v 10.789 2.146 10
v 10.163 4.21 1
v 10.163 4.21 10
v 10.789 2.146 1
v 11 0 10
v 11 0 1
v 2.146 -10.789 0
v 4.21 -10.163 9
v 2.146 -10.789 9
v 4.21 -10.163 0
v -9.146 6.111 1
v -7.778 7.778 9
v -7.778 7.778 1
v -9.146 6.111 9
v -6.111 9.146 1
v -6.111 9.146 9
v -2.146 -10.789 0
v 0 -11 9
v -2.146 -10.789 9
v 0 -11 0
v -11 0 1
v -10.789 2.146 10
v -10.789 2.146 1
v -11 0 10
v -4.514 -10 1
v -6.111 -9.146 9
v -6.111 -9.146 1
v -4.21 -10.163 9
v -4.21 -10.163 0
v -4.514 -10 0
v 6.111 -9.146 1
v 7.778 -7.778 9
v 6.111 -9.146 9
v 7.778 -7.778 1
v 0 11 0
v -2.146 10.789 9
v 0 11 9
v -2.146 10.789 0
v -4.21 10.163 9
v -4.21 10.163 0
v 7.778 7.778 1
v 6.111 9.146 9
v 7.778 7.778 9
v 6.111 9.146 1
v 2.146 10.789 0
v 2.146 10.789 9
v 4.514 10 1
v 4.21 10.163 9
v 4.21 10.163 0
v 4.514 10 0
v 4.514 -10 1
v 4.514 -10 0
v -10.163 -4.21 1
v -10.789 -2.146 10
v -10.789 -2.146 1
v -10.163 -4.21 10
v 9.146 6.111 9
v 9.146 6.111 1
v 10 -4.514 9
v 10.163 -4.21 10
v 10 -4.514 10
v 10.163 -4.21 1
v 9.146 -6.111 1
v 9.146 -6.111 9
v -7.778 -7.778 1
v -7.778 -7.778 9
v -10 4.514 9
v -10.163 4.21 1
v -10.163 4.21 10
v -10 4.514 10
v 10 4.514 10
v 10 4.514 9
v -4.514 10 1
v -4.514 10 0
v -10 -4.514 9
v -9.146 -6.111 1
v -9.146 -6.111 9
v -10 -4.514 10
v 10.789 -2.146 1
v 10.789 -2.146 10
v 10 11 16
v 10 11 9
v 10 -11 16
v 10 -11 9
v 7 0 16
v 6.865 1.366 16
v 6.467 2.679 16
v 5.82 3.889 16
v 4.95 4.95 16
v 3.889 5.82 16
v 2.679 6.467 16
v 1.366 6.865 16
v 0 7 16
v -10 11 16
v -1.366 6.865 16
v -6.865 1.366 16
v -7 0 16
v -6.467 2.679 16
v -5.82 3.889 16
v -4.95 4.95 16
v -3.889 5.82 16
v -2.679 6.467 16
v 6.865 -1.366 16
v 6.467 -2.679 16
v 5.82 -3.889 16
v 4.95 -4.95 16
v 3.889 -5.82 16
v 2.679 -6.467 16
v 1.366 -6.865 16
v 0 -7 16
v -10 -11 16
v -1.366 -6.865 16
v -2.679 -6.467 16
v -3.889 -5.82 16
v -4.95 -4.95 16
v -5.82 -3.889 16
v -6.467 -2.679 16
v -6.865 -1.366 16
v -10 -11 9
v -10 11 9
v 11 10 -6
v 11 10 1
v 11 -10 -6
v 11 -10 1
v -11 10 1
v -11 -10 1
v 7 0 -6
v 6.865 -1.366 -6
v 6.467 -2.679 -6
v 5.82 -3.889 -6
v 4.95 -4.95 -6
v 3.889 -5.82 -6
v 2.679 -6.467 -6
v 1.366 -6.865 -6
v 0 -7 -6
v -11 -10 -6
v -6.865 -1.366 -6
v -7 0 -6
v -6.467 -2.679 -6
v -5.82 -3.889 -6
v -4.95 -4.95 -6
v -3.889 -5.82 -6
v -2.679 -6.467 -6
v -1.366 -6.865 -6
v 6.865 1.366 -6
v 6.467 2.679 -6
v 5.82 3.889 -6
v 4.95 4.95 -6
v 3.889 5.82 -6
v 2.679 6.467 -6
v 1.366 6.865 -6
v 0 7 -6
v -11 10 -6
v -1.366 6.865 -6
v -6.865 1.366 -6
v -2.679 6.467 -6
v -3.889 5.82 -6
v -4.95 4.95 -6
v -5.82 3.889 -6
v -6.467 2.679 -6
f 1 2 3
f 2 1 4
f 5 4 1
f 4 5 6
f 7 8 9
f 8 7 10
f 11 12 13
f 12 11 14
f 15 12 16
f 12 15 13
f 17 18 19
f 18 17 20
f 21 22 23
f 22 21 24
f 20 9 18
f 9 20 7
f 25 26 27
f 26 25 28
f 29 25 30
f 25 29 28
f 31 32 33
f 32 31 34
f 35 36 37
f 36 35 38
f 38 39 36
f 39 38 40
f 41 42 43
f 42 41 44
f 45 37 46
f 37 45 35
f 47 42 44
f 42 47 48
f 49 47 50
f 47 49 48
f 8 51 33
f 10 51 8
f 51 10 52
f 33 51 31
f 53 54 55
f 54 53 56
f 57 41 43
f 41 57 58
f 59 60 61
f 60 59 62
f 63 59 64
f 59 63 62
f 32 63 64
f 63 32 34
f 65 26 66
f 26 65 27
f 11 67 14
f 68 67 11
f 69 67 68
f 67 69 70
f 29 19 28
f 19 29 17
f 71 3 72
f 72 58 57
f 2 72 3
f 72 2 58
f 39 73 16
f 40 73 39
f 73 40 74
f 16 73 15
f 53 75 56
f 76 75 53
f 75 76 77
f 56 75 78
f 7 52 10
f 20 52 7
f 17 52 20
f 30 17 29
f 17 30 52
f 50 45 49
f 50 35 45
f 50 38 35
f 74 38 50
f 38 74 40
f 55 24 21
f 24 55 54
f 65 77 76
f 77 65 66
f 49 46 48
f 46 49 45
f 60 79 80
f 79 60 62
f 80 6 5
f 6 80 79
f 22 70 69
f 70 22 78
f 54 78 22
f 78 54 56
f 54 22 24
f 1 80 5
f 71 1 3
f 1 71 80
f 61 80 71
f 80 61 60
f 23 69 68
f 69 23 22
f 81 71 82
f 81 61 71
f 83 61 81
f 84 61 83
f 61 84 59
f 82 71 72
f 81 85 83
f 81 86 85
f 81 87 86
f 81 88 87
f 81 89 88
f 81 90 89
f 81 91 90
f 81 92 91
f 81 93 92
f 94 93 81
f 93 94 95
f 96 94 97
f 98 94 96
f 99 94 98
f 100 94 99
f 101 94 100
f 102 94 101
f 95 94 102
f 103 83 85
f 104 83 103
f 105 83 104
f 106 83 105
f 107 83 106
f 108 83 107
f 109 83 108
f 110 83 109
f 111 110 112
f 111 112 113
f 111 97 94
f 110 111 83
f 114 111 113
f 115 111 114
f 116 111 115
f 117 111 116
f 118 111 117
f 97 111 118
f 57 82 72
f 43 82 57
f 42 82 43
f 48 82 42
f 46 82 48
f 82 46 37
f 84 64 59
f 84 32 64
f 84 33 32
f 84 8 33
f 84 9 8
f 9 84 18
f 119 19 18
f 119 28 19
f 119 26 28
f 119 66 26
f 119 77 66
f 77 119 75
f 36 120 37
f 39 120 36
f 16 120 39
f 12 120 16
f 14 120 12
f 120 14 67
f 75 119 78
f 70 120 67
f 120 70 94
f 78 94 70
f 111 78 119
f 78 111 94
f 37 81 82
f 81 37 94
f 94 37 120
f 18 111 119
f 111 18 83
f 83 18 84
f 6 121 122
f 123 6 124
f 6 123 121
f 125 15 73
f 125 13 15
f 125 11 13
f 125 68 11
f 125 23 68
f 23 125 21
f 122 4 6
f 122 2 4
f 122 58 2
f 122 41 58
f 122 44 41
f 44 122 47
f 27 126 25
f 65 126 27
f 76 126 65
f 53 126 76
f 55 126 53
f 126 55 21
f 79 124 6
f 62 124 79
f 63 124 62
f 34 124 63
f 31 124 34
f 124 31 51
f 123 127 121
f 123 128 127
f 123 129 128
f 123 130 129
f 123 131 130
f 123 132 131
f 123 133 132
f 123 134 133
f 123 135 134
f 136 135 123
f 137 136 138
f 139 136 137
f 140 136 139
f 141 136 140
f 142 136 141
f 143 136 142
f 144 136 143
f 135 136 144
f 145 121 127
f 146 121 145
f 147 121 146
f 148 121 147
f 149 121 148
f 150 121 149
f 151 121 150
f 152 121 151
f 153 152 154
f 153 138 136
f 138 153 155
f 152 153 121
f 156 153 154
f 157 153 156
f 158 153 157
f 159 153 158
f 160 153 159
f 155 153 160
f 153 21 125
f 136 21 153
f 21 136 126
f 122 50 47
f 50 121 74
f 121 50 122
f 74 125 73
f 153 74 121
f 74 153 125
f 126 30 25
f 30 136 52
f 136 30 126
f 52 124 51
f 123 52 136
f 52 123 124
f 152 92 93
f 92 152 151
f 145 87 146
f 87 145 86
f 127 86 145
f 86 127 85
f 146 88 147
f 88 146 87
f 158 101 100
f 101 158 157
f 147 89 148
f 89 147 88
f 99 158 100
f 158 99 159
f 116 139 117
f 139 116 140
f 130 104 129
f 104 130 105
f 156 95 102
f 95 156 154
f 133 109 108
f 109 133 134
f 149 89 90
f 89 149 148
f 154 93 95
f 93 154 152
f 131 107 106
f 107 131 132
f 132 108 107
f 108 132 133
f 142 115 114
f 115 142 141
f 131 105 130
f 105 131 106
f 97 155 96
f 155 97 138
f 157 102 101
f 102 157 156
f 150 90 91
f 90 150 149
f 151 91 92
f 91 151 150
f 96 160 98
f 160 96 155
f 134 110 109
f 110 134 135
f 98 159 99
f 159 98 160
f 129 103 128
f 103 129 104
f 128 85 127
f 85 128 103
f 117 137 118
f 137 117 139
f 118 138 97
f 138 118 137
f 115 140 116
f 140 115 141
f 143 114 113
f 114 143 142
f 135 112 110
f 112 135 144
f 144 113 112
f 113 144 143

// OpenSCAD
$fn = 32;

// ----------------------------------------------------------------------
// Oldham coupling disc: 22 x 22 mm
// ----------------------------------------------------------------------

// --- parameters (mm) ---
disc_d = 22;              // disc diameter
disc_t = 10;              // disc thickness
tongue_w = 20;            // tongue width
tongue_h = 6;             // tongue height
bore_d = 14;              // centre lightening bore

module disc() {
  cylinder(h = disc_t, d = disc_d);
  /* tongue on the top face, sunk 1 mm into the disc */
  translate([-tongue_w / 2, -disc_d / 2, disc_t - 1]) cube([tongue_w, disc_d, tongue_h + 1]);
  /* slot wall on the bottom face, 90 degrees turned */
  translate([-disc_d / 2, -tongue_w / 2, -tongue_h]) cube([disc_d, tongue_w, tongue_h + 1]);
}

difference() {
  disc();
  translate([0, 0, -tongue_h - 1]) cylinder(h = disc_t + 2 * tongue_h + 2, d = bore_d);
}
